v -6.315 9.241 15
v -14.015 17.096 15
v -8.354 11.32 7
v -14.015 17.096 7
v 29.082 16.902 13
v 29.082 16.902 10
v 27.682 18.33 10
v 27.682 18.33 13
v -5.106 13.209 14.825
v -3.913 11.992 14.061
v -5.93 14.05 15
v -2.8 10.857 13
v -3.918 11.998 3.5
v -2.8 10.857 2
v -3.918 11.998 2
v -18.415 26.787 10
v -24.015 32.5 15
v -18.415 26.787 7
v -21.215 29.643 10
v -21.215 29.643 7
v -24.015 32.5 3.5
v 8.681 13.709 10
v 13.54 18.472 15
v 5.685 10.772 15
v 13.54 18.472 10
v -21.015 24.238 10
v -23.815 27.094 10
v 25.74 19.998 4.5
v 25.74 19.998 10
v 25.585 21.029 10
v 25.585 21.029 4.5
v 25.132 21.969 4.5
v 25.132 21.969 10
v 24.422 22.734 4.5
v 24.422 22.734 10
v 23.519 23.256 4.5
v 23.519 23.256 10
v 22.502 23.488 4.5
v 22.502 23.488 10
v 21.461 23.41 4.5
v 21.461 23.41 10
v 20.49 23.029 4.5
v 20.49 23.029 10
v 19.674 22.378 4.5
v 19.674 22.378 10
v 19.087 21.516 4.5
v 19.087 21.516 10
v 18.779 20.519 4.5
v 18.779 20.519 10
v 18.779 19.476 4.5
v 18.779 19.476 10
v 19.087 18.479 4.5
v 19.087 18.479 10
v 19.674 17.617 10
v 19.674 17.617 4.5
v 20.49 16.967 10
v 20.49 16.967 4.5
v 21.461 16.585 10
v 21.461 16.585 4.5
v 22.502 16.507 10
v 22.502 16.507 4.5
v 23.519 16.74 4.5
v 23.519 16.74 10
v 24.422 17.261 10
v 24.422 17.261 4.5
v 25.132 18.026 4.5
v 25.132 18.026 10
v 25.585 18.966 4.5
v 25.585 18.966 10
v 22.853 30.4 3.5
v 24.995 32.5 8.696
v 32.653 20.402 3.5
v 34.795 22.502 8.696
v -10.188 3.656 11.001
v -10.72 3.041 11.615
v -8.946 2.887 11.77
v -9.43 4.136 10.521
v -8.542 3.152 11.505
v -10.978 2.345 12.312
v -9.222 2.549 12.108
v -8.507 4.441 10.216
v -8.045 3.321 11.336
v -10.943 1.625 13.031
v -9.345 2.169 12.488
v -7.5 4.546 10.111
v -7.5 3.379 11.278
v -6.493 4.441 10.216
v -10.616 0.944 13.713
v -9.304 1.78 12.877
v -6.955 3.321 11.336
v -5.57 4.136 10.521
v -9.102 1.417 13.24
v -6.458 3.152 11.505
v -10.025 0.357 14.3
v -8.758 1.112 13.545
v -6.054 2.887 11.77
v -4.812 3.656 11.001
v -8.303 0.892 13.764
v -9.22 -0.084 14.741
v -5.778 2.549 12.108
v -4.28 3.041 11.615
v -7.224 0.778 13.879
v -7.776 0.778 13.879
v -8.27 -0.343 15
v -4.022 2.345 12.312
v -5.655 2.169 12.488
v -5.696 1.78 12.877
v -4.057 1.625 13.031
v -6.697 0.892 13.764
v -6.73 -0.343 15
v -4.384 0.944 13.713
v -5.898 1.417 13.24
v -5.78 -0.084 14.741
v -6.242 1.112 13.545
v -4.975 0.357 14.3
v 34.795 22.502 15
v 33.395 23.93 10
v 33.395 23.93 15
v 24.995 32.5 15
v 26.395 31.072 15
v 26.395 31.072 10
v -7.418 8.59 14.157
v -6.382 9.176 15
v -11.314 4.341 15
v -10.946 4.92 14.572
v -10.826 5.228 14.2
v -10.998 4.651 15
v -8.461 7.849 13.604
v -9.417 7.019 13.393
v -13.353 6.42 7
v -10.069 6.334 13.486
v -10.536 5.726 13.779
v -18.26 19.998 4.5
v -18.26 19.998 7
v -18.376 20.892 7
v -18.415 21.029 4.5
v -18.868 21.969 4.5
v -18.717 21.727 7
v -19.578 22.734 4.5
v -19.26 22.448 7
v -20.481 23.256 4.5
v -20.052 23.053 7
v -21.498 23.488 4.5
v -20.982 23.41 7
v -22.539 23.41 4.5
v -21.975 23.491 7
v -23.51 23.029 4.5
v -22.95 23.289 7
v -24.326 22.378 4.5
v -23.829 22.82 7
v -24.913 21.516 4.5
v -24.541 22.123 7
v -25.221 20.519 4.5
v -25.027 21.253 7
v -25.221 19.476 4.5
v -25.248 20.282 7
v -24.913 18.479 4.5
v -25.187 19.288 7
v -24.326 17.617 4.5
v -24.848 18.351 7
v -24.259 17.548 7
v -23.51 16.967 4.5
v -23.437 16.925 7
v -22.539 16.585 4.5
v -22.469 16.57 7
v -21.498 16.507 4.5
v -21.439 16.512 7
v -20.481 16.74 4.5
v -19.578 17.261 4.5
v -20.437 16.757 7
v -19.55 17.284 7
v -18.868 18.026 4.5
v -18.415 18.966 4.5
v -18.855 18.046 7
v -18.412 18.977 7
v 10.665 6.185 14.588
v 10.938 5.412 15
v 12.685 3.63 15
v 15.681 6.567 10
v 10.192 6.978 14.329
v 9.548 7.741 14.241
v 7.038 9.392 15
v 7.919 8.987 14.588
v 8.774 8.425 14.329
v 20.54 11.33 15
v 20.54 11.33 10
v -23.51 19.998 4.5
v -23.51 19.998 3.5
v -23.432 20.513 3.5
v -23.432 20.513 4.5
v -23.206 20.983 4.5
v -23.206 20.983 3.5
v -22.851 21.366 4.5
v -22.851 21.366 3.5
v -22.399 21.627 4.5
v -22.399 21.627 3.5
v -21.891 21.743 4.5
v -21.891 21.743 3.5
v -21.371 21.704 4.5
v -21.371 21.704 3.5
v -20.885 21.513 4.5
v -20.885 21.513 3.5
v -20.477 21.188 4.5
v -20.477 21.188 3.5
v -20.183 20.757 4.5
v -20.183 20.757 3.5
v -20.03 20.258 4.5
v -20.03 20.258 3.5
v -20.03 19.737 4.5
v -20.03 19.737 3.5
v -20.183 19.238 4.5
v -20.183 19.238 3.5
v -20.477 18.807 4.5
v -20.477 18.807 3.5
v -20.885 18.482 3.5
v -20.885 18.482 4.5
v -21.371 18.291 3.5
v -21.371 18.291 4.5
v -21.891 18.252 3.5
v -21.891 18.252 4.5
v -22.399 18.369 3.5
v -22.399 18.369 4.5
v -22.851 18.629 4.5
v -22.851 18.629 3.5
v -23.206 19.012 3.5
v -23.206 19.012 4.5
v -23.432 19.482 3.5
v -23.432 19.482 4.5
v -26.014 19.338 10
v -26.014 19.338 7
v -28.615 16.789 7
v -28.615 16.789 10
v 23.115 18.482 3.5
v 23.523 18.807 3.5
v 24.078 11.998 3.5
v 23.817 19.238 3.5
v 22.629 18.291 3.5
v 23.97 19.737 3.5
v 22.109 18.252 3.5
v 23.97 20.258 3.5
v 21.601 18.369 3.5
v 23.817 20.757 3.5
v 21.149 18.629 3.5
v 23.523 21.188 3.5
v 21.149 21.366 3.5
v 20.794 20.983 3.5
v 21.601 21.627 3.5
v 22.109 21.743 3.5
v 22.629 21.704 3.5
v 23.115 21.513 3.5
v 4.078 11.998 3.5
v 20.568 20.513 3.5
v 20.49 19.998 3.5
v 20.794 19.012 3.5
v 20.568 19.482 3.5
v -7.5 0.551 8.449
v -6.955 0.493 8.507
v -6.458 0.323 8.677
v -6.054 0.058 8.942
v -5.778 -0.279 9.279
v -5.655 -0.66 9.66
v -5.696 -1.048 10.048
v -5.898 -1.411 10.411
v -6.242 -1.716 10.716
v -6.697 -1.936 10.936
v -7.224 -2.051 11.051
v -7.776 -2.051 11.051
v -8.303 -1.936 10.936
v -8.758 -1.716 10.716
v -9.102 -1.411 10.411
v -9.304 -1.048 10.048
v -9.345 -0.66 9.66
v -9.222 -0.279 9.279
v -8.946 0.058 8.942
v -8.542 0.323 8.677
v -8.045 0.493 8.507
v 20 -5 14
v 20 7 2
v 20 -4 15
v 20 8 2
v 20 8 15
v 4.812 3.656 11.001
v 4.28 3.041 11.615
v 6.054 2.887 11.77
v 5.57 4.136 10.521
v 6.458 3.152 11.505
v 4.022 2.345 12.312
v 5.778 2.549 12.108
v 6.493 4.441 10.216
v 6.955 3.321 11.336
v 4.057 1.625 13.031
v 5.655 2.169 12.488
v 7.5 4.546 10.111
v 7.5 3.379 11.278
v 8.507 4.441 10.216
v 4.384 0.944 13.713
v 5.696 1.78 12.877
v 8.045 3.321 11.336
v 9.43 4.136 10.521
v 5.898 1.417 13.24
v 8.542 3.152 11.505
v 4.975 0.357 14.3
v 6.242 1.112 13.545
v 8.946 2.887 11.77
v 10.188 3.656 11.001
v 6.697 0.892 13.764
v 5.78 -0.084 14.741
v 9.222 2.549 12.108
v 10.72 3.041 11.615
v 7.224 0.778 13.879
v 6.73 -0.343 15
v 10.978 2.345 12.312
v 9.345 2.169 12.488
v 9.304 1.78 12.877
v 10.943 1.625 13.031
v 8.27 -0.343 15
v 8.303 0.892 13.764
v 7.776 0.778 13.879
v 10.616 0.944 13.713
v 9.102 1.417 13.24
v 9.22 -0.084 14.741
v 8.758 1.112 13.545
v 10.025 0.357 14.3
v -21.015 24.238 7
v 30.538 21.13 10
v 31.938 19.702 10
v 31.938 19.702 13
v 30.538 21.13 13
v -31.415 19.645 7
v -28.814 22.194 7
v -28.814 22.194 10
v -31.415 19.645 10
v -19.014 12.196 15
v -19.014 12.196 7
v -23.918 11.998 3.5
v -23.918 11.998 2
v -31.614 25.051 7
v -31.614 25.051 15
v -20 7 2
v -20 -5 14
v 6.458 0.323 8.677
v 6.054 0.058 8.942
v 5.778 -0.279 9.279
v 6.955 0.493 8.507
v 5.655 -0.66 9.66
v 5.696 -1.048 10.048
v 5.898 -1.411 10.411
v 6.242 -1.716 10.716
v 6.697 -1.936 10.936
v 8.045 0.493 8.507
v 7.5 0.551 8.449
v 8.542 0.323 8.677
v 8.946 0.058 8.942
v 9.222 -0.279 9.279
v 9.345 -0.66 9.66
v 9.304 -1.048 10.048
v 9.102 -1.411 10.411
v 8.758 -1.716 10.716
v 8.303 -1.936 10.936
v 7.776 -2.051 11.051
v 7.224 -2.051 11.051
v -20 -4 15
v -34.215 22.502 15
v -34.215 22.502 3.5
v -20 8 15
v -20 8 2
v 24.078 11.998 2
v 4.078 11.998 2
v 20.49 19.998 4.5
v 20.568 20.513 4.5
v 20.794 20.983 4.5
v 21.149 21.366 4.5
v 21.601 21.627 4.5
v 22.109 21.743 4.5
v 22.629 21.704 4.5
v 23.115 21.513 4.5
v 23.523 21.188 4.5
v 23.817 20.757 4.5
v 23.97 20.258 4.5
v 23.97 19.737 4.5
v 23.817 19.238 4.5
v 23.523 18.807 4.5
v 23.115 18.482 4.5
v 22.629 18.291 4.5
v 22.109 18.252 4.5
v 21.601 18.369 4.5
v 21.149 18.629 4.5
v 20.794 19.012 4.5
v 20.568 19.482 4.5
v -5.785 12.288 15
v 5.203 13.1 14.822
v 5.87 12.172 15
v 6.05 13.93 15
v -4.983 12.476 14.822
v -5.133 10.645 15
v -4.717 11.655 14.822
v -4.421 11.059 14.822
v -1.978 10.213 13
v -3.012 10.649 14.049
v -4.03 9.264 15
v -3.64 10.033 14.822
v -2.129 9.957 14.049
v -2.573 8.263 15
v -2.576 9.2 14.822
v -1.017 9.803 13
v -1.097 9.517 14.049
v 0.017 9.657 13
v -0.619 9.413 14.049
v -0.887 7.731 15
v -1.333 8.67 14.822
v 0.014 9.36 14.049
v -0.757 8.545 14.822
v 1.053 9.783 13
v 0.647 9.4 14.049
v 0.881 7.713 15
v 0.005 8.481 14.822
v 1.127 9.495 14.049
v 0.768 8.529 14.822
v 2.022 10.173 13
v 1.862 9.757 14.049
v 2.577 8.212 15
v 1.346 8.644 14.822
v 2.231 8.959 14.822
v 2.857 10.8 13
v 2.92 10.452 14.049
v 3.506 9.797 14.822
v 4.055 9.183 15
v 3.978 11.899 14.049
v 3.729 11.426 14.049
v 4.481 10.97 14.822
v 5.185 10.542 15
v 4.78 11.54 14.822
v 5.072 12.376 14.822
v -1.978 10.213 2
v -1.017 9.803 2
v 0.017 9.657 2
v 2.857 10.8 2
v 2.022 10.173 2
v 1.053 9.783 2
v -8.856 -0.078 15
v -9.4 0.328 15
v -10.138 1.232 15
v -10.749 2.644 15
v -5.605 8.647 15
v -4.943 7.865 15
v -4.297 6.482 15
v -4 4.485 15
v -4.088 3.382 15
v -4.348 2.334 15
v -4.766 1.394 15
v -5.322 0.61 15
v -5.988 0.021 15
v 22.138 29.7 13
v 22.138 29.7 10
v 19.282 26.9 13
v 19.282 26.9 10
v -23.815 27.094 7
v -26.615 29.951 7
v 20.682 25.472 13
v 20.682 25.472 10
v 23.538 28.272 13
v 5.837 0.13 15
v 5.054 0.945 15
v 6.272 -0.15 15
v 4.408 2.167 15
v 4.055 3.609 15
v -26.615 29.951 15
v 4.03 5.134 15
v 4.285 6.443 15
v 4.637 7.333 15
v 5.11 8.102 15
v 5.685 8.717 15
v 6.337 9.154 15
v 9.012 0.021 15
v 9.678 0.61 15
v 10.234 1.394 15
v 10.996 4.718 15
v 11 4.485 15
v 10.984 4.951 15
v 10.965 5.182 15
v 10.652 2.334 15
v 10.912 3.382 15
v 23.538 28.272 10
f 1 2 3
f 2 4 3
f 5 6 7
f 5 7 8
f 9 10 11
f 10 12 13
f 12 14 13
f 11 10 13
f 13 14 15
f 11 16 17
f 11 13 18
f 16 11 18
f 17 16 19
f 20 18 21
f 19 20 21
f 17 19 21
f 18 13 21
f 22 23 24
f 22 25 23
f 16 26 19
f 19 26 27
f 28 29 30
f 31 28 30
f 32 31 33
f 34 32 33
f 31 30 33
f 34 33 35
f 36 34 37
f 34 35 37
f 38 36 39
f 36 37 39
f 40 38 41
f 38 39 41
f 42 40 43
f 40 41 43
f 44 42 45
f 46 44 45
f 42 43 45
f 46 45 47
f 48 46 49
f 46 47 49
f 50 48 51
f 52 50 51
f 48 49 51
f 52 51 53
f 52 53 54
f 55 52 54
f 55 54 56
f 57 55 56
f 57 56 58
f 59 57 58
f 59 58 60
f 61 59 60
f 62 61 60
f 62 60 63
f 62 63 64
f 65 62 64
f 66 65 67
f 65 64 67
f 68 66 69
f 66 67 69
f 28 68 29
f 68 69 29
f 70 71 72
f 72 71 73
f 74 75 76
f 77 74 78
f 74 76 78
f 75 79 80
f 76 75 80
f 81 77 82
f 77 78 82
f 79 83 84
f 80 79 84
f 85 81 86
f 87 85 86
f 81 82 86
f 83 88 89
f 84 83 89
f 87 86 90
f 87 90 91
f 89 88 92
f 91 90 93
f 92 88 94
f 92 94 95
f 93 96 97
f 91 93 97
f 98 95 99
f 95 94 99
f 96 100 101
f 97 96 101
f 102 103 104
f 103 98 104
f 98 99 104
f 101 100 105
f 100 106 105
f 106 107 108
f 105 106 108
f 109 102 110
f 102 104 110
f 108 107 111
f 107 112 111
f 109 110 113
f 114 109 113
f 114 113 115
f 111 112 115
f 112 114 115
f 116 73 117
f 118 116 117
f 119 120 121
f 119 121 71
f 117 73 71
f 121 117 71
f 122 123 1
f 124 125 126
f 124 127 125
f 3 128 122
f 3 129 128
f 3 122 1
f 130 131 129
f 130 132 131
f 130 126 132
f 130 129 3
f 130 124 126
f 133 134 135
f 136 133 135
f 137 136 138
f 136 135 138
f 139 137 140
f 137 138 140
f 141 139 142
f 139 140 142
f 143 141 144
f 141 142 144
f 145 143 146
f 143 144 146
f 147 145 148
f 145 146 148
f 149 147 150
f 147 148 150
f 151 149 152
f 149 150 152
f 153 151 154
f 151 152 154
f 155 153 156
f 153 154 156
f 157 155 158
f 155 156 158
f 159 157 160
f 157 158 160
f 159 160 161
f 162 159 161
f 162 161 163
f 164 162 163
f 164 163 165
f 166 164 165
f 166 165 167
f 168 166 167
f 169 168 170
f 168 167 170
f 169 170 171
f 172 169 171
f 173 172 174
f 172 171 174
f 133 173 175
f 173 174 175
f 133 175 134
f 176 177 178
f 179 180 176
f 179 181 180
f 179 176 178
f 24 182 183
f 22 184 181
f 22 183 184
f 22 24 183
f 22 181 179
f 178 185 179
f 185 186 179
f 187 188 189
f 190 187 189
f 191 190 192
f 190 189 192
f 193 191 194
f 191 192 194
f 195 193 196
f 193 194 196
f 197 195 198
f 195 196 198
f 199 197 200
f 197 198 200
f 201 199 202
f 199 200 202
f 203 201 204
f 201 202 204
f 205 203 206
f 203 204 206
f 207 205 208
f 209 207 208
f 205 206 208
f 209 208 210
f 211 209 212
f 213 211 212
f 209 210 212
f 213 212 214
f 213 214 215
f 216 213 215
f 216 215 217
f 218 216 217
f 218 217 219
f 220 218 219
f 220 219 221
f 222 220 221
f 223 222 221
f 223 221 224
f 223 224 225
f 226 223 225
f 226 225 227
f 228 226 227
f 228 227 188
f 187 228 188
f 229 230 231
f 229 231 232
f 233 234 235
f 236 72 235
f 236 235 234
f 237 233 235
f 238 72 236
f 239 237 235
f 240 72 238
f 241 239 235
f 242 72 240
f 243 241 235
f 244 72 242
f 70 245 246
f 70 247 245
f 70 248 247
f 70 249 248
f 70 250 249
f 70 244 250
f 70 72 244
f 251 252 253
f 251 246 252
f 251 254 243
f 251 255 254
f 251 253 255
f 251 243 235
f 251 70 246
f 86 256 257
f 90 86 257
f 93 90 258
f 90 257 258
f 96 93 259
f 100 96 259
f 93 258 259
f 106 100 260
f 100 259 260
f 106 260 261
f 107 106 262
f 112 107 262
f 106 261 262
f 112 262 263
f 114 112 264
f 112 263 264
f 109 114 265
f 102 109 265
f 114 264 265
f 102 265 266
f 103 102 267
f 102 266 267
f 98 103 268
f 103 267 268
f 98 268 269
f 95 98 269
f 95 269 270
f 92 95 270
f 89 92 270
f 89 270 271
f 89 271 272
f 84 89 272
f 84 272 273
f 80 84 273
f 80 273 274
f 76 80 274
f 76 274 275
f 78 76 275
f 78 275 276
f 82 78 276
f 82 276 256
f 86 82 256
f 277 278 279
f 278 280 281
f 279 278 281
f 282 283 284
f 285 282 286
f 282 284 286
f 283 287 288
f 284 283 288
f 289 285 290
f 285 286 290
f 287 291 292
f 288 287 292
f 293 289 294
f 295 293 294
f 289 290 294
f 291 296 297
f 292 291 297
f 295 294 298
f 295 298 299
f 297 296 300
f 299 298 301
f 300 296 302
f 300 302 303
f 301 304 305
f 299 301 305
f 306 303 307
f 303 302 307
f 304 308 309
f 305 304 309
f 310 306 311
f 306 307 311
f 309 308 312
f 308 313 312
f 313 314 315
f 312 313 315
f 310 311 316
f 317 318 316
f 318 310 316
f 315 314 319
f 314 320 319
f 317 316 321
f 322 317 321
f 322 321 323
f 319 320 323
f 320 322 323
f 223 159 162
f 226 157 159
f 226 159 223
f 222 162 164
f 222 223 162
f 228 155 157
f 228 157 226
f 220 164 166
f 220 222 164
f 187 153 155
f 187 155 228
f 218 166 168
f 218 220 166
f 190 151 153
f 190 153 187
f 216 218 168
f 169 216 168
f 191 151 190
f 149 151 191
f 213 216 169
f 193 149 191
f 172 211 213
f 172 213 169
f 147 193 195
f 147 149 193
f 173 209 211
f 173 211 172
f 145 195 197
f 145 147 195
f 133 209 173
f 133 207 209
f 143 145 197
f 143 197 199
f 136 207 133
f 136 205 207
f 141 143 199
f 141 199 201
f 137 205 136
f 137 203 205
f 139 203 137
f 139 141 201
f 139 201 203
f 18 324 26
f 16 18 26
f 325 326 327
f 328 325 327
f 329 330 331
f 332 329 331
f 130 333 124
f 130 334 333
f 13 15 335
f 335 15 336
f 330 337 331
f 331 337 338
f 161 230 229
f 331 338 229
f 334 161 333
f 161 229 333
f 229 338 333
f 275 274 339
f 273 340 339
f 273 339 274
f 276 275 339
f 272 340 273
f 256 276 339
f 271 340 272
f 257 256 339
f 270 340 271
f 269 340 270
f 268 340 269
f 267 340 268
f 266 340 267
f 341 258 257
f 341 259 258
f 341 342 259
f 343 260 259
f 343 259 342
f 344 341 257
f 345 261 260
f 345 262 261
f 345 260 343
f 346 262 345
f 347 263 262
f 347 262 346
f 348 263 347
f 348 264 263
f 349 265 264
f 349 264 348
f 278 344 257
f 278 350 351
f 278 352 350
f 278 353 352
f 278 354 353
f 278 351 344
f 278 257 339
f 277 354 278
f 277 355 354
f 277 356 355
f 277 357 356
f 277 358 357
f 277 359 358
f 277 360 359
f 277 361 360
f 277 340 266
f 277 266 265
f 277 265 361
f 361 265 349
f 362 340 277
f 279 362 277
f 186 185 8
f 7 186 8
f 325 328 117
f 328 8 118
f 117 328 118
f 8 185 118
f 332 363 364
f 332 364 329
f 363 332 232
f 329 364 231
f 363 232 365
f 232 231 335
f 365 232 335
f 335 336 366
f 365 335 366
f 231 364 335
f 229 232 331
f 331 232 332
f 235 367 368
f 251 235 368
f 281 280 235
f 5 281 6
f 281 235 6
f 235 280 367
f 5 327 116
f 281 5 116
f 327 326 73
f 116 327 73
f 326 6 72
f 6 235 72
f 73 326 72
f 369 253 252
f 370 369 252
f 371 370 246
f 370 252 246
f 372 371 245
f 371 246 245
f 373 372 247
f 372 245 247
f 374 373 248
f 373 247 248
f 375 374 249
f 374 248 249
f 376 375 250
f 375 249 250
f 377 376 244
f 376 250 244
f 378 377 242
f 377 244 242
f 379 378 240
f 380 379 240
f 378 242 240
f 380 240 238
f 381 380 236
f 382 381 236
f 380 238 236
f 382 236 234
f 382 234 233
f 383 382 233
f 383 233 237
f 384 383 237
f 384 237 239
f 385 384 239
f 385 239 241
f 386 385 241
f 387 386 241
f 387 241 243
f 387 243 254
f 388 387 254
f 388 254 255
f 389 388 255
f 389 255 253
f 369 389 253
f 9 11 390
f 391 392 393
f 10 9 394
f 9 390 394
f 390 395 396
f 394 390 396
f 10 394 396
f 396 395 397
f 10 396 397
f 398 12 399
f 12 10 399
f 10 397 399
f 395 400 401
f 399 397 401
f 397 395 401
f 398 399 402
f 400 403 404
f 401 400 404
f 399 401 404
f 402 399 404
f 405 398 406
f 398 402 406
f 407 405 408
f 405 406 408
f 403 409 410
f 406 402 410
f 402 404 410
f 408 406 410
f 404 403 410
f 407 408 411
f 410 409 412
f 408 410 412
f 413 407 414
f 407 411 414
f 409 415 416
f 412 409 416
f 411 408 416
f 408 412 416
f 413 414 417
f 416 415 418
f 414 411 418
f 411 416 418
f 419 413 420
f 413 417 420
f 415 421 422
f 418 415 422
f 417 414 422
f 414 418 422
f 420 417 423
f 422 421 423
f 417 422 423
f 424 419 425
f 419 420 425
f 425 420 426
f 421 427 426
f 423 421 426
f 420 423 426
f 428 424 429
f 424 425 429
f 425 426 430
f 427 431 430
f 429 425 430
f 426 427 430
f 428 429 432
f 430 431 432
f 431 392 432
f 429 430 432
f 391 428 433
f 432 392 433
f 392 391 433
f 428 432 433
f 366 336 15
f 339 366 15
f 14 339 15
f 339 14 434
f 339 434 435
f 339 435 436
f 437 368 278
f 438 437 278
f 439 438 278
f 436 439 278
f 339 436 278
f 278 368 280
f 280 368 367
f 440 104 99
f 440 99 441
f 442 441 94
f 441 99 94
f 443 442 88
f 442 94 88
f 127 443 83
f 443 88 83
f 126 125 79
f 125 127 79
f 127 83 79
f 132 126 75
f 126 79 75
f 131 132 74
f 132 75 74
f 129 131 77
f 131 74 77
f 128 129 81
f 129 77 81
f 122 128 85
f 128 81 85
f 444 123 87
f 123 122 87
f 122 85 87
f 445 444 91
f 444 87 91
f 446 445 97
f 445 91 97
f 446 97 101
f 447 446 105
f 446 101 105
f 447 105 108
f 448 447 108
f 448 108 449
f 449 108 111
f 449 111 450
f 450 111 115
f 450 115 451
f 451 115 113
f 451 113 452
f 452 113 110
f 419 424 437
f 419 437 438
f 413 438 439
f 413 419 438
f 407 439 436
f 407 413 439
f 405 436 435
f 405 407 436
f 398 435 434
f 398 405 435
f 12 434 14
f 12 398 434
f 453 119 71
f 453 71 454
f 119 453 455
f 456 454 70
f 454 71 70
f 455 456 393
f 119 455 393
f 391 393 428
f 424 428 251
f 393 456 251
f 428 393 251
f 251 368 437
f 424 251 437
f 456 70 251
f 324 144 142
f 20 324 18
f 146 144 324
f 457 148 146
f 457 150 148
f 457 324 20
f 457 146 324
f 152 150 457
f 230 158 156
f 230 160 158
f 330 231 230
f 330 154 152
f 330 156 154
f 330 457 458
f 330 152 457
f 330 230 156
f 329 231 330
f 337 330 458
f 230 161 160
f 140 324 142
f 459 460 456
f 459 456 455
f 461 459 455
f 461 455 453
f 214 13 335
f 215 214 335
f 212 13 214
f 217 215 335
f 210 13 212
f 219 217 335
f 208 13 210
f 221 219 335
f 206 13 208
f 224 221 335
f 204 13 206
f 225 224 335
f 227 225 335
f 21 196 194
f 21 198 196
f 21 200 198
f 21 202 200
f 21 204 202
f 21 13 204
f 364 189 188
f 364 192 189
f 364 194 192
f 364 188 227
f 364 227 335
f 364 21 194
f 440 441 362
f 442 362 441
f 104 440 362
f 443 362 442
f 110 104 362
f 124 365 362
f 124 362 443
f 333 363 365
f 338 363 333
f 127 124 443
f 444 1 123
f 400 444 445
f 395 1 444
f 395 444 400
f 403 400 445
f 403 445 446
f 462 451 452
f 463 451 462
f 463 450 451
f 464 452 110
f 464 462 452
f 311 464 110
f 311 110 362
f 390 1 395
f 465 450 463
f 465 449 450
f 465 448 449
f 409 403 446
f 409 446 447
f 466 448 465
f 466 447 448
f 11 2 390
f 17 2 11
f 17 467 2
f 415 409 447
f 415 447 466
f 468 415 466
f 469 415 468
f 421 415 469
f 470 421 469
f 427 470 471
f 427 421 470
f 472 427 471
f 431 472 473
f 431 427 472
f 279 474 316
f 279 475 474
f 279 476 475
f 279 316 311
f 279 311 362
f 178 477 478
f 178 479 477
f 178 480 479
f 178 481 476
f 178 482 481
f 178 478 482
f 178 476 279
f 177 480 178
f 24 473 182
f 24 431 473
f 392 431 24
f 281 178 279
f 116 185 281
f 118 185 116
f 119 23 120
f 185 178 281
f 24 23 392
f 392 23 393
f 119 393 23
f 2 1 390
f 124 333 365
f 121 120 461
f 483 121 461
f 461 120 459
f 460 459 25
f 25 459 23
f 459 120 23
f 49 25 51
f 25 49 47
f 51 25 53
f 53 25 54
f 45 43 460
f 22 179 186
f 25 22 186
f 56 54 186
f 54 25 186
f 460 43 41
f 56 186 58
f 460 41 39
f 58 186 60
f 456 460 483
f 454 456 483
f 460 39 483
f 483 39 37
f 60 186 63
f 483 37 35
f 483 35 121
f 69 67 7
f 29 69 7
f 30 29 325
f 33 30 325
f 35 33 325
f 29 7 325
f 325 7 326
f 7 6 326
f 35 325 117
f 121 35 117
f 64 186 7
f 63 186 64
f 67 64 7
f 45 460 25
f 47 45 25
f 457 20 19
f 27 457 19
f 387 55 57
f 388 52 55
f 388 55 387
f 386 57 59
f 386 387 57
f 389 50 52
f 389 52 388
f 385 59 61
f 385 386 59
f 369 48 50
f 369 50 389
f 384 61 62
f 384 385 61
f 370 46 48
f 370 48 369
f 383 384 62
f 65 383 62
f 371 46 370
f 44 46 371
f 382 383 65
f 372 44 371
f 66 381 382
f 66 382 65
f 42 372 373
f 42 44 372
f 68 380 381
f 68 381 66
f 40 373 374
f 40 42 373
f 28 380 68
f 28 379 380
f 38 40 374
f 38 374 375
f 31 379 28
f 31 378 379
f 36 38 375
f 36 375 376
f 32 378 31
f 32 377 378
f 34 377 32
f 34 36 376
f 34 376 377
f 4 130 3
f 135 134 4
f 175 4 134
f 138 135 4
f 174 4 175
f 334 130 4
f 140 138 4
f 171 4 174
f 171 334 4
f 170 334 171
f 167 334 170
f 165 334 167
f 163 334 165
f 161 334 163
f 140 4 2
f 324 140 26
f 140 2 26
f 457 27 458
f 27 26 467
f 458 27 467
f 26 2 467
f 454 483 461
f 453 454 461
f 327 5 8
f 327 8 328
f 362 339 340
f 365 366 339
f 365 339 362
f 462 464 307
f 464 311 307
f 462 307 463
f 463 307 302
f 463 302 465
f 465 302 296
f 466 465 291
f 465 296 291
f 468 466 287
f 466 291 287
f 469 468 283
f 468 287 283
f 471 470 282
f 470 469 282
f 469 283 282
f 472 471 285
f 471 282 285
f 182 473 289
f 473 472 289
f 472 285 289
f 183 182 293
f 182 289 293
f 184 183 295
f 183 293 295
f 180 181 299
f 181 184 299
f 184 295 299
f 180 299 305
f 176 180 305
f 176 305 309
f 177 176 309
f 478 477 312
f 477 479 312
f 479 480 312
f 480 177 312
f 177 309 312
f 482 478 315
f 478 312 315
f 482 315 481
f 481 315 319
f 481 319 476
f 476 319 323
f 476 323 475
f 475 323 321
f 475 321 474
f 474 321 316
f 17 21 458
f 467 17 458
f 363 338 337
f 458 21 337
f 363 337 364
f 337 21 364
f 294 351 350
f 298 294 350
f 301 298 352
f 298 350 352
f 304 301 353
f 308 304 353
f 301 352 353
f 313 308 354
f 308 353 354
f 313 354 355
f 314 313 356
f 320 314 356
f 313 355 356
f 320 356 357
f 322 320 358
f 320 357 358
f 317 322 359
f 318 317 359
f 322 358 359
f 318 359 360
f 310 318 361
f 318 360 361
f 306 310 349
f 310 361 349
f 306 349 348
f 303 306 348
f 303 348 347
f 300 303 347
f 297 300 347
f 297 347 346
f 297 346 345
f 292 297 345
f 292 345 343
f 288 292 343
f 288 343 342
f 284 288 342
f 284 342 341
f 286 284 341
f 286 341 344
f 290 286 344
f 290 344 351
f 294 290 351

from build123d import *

# Parameters (mm, degrees)
BOSS_EXTRU_1_DEPTH       = 15
ENL_V_MAT_EXTRU_1_DEPTH  = 5
ENL_V_MAT_EXTRU_2_DEPTH  = 8
CHANFREIN1_SIZE          = 11
CHANFREIN1_SIZE_2        = 13.109289519
ESQUISSE8_W              = 3
ESQUISSE8_H              = 4
ENL_V_MAT_EXTRU_6_DEPTH  = 50
ESQUISSE7_W              = 4
ESQUISSE7_H              = 3
ENL_V_MAT_EXTRU_5_DEPTH  = 50
ESQUISSE6_W              = 69.009802941
ESQUISSE6_H              = 2
ENL_V_MAT_EXTRU_4_DEPTH  = 100
CHANFREIN2_SIZE          = 11
CHANFREIN2_SIZE_2        = 30.222251614
ESQUISSE9_W              = 40
ESQUISSE9_H              = 13
BOSS_EXTRU_2_DEPTH       = 5
CHANFREIN4_SIZE          = 12
ESQUISSE10_R             = 1.75
ENL_V_MAT_EXTRU_7_DEPTH  = 1.5
CHANFREIN5_SIZE          = 3
CHANFREIN5_SIZE2         = 5.196152423
ESQUISSE11_R             = 1.75
ENL_V_MAT_EXTRU_8_DEPTH  = 50.355263045
ESQUISSE12_R             = 3.5
ENL_V_MAT_EXTRU_9_DEPTH  = 2.5
ESQUISSE13_R             = 3.5
ENL_V_MAT_EXTRU_10_DEPTH = 5.5
CONG_1_R                 = 4
CHANFREIN10_SIZE         = 1
ESQUISSE14_R             = 1.85
ENL_V_MAT_EXTRU_11_DEPTH = 46.879646797
ENL_V_START              = -4
ESQUISSE15_R             = 3.5
ENL_V_MAT_EXTRU_12_DEPTH = 42.879646797


with BuildPart() as part:
    # Esquisse1 → Boss.-Extru.1 (new body)
    with BuildSketch(Plane.XY):
        Polygon((-20, 0), (20, 0), (20, 8), (34.7949995, 22.5020002), (24.9949995, 32.5), (0, 8), (-24.014803441, 32.5), (-34.214803441, 22.5020002), (-20, 8), align=None)
    extrude(amount=BOSS_EXTRU_1_DEPTH)

    # Esquisse2 → Enlèv. mat.-Extru.1 (cut)
    with BuildSketch(Plane.XY.offset(15)):
        Polygon((26.3949995, 31.071714314), (13.540428329, 18.471714314), (20.540428329, 11.330285886), (33.3949995, 23.930285886), align=None)
    extrude(amount=-ENL_V_MAT_EXTRU_1_DEPTH, mode=Mode.SUBTRACT)

    # Esquisse3 → Enlèv. mat.-Extru.2 (cut)
    with BuildSketch(Plane.XY.offset(15)):
        Polygon((-31.614303391, 25.0510001), (-19.014303391, 12.196428929), (-14.015303491, 17.096428929), (-26.615303491, 29.9510001), align=None)
    extrude(amount=-ENL_V_MAT_EXTRU_2_DEPTH, mode=Mode.SUBTRACT)

    # Chanfrein1
    # the kernel refuses this chamfer: 13.109289519, 11 mm, written as the material it takes off along each edge
    with BuildSketch(Plane(origin=(13.540428329, 18.471714314, 15), x_dir=(-0.7141428428542841, -0.7000000000000011, 0), z_dir=(0.7000000000000011, -0.7141428428542841, 0))) as chanfrein1_piece_1_section:
        Polygon((CHANFREIN1_SIZE, 0), (0, CHANFREIN1_SIZE_2), (0, 0), align=None)
    chanfrein1_piece_1 = extrude(amount=10, mode=Mode.PRIVATE)
    chanfrein1_piece_1 = split(chanfrein1_piece_1, bisect_by=Plane(origin=(13.540428329, 18.471714314, 10), z_dir=(0, 0, 1)), keep=Keep.TOP, mode=Mode.PRIVATE)
    add(chanfrein1_piece_1, mode=Mode.SUBTRACT)

    # Esquisse8 → Enlèv. mat.-Extru.6 (cut)
    with BuildSketch(Plane(origin=(-6.20080008, -6.0779998, 0), x_dir=(0, 0, 1), z_dir=(-0.7141428428542848, -0.7000000000000004, 0))):
        with Locations((8.5, 34.020004802)):
            Rectangle(ESQUISSE8_W, ESQUISSE8_H)
    extrude(amount=-ENL_V_MAT_EXTRU_6_DEPTH, mode=Mode.SUBTRACT)

    # Esquisse7 → Enlèv. mat.-Extru.5 (cut)
    with BuildSketch(Plane(origin=(5.80080008, -5.9179998, 0), x_dir=(0.714142842854285, 0.7000000000000002, 0), z_dir=(0.7000000000000002, -0.714142842854285, 0))):
        with Locations((34.6, 11.5)):
            Rectangle(ESQUISSE7_W, ESQUISSE7_H)
    extrude(amount=-ENL_V_MAT_EXTRU_5_DEPTH, mode=Mode.SUBTRACT)

    # Esquisse6 → Enlèv. mat.-Extru.4 (cut)
    with BuildSketch(Plane.XZ):
        with Locations((0.29009803, 1)):
            Rectangle(ESQUISSE6_W, ESQUISSE6_H)
    extrude(amount=-ENL_V_MAT_EXTRU_4_DEPTH, mode=Mode.SUBTRACT)

    # Chanfrein2
    # the kernel refuses this chamfer: 30.222251614, 11 mm, written as the material it takes off along each edge
    with BuildSketch(Plane(origin=(-19.014303391, 12.196428929, 15), x_dir=(0.7000000000000006, -0.7141428428542845, 0), z_dir=(0.7141428428542845, 0.7000000000000005, 0))) as chanfrein2_piece_1_section:
        Polygon((CHANFREIN2_SIZE, 0), (0, CHANFREIN2_SIZE_2), (0, 0), align=None)
    chanfrein2_piece_1 = extrude(amount=7, mode=Mode.PRIVATE)
    chanfrein2_piece_1 = split(chanfrein2_piece_1, bisect_by=Plane(origin=(-19.014303391, 12.196428929, 7), z_dir=(0, 0, 1)), keep=Keep.TOP, mode=Mode.PRIVATE)
    add(chanfrein2_piece_1, mode=Mode.SUBTRACT)

    # Esquisse9 → Boss.-Extru.2 (add)
    with BuildSketch(Plane.XZ):
        with Locations((0, 8.5)):
            Rectangle(ESQUISSE9_W, ESQUISSE9_H)
    extrude(amount=BOSS_EXTRU_2_DEPTH)

    # Chanfrein4
    chanfrein4_edges = [part.edges().sort_by_distance(p)[0] for p in [
        (0, -5, 2),
    ]]
    chamfer(chanfrein4_edges, length=CHANFREIN4_SIZE)

    # Esquisse10 → Enlèv. mat.-Extru.7 (cut)
    with BuildSketch(Plane(origin=(0, 0, 2), x_dir=(-1, 0, 0), z_dir=(0, 0, -1))):
        Polygon((-35.24, 27.99759976), (-35.24, 11.99759976), (34.76, 11.99759976), (34.76, 27.99759976), (34.76, 37.99759976), (-35.24, 37.99759976), align=None)
        with Locations((-22.24, 19.99759976)):
            Circle(ESQUISSE10_R, mode=Mode.SUBTRACT)
        with Locations((21.76, 19.99759976)):
            Circle(ESQUISSE10_R, mode=Mode.SUBTRACT)
    extrude(amount=-ENL_V_MAT_EXTRU_7_DEPTH, mode=Mode.SUBTRACT)

    # Chanfrein5
    chanfrein5_edges = [part.edges().sort_by_distance(p)[0] for p in [
        (29.8949995, 27.5010001, 3.5),
    ]]
    chanfrein5_side = [part.faces().sort_by_distance(p)[0] for p in [
        (29.178170188, 17.513536316, 3.5),
    ]]
    chamfer(chanfrein5_edges, length=CHANFREIN5_SIZE, length2=CHANFREIN5_SIZE2, reference=chanfrein5_side[0])

    # Esquisse11 → Enlèv. mat.-Extru.8 (cut, through all)
    with BuildSketch(Plane(origin=(0, 0, 2), x_dir=(-1, 0, 0), z_dir=(0, 0, -1))):
        with Locations((-22.24, 19.99759976)):
            Circle(ESQUISSE11_R)
        with Locations((21.76, 19.99759976)):
            Circle(ESQUISSE11_R)
    extrude(amount=-ENL_V_MAT_EXTRU_8_DEPTH, mode=Mode.SUBTRACT)

    # Esquisse12 → Enlèv. mat.-Extru.9 (cut)
    with BuildSketch(Plane.XY.offset(7)):
        with Locations((-21.76, 19.99759976)):
            Circle(ESQUISSE12_R)
    extrude(amount=-ENL_V_MAT_EXTRU_9_DEPTH, mode=Mode.SUBTRACT)

    # Esquisse13 → Enlèv. mat.-Extru.10 (cut)
    with BuildSketch(Plane.XY.offset(10)):
        with Locations((22.24, 19.99759976)):
            Circle(ESQUISSE13_R)
    extrude(amount=-ENL_V_MAT_EXTRU_10_DEPTH, mode=Mode.SUBTRACT)

    # Congé1
    cong_1_edges = [part.edges().sort_by_distance(p)[0] for p in [
        (0, 8, 8.5),
    ]]
    fillet(cong_1_edges, radius=CONG_1_R)

    # Chanfrein10
    chanfrein10_edges = [part.edges().sort_by_distance(p)[0] for p in [
        (0, -5, 15),
    ]]
    chamfer(chanfrein10_edges, length=CHANFREIN10_SIZE - 0.0001)  # a hair under: the kernel refuses the full size

    # Esquisse14 → Enlèv. mat.-Extru.11 (cut, through all)
    with BuildSketch(Plane(origin=(0, 4.5, 4.5), x_dir=(1, 0, 0), z_dir=(0, -0.7071067811865464, -0.7071067811865488))):
        with Locations(Location((-7.5, 7.435028843, 0), (0, 0, 270))):
            Circle(ESQUISSE14_R)
        with Locations(Location((7.5, 7.435028843, 0), (0, 0, 270))):
            Circle(ESQUISSE14_R)
    extrude(amount=-ENL_V_MAT_EXTRU_11_DEPTH, mode=Mode.SUBTRACT)

    # Esquisse15 → Enlèv. mat.-Extru.12 (cut, through all)
    with BuildSketch(Plane(origin=(0, 4.5, 4.5), x_dir=(1, 0, 0), z_dir=(0, -0.7071067811865464, -0.7071067811865488)).offset(ENL_V_START)):
        with Locations((-7.5, 7.435028843)):
            Circle(ESQUISSE15_R)
        with Locations((7.5, 7.435028843)):
            Circle(ESQUISSE15_R)
    extrude(amount=-ENL_V_MAT_EXTRU_12_DEPTH, mode=Mode.SUBTRACT)

    # Congé2: read off the stored shape, not the designer's step
    # Congé2 outline → Congé2 (revolve, cut)
    with BuildSketch(Plane(origin=(0.056571371, 13.656571371, 0), x_dir=(1, 0, 0), z_dir=(0, -1, 0))):
        with BuildLine():
            ThreePointArc((4, 13), (4.585786438, 14.414213562), (6, 15))
            Line((6, 15), (4, 15))
            Line((4, 15), (4, 13))
        make_face()
    revolve(axis=Axis((0.056571371, 13.656571371, 0), (0, 0, 1)), mode=Mode.SUBTRACT)


solid = part.part
